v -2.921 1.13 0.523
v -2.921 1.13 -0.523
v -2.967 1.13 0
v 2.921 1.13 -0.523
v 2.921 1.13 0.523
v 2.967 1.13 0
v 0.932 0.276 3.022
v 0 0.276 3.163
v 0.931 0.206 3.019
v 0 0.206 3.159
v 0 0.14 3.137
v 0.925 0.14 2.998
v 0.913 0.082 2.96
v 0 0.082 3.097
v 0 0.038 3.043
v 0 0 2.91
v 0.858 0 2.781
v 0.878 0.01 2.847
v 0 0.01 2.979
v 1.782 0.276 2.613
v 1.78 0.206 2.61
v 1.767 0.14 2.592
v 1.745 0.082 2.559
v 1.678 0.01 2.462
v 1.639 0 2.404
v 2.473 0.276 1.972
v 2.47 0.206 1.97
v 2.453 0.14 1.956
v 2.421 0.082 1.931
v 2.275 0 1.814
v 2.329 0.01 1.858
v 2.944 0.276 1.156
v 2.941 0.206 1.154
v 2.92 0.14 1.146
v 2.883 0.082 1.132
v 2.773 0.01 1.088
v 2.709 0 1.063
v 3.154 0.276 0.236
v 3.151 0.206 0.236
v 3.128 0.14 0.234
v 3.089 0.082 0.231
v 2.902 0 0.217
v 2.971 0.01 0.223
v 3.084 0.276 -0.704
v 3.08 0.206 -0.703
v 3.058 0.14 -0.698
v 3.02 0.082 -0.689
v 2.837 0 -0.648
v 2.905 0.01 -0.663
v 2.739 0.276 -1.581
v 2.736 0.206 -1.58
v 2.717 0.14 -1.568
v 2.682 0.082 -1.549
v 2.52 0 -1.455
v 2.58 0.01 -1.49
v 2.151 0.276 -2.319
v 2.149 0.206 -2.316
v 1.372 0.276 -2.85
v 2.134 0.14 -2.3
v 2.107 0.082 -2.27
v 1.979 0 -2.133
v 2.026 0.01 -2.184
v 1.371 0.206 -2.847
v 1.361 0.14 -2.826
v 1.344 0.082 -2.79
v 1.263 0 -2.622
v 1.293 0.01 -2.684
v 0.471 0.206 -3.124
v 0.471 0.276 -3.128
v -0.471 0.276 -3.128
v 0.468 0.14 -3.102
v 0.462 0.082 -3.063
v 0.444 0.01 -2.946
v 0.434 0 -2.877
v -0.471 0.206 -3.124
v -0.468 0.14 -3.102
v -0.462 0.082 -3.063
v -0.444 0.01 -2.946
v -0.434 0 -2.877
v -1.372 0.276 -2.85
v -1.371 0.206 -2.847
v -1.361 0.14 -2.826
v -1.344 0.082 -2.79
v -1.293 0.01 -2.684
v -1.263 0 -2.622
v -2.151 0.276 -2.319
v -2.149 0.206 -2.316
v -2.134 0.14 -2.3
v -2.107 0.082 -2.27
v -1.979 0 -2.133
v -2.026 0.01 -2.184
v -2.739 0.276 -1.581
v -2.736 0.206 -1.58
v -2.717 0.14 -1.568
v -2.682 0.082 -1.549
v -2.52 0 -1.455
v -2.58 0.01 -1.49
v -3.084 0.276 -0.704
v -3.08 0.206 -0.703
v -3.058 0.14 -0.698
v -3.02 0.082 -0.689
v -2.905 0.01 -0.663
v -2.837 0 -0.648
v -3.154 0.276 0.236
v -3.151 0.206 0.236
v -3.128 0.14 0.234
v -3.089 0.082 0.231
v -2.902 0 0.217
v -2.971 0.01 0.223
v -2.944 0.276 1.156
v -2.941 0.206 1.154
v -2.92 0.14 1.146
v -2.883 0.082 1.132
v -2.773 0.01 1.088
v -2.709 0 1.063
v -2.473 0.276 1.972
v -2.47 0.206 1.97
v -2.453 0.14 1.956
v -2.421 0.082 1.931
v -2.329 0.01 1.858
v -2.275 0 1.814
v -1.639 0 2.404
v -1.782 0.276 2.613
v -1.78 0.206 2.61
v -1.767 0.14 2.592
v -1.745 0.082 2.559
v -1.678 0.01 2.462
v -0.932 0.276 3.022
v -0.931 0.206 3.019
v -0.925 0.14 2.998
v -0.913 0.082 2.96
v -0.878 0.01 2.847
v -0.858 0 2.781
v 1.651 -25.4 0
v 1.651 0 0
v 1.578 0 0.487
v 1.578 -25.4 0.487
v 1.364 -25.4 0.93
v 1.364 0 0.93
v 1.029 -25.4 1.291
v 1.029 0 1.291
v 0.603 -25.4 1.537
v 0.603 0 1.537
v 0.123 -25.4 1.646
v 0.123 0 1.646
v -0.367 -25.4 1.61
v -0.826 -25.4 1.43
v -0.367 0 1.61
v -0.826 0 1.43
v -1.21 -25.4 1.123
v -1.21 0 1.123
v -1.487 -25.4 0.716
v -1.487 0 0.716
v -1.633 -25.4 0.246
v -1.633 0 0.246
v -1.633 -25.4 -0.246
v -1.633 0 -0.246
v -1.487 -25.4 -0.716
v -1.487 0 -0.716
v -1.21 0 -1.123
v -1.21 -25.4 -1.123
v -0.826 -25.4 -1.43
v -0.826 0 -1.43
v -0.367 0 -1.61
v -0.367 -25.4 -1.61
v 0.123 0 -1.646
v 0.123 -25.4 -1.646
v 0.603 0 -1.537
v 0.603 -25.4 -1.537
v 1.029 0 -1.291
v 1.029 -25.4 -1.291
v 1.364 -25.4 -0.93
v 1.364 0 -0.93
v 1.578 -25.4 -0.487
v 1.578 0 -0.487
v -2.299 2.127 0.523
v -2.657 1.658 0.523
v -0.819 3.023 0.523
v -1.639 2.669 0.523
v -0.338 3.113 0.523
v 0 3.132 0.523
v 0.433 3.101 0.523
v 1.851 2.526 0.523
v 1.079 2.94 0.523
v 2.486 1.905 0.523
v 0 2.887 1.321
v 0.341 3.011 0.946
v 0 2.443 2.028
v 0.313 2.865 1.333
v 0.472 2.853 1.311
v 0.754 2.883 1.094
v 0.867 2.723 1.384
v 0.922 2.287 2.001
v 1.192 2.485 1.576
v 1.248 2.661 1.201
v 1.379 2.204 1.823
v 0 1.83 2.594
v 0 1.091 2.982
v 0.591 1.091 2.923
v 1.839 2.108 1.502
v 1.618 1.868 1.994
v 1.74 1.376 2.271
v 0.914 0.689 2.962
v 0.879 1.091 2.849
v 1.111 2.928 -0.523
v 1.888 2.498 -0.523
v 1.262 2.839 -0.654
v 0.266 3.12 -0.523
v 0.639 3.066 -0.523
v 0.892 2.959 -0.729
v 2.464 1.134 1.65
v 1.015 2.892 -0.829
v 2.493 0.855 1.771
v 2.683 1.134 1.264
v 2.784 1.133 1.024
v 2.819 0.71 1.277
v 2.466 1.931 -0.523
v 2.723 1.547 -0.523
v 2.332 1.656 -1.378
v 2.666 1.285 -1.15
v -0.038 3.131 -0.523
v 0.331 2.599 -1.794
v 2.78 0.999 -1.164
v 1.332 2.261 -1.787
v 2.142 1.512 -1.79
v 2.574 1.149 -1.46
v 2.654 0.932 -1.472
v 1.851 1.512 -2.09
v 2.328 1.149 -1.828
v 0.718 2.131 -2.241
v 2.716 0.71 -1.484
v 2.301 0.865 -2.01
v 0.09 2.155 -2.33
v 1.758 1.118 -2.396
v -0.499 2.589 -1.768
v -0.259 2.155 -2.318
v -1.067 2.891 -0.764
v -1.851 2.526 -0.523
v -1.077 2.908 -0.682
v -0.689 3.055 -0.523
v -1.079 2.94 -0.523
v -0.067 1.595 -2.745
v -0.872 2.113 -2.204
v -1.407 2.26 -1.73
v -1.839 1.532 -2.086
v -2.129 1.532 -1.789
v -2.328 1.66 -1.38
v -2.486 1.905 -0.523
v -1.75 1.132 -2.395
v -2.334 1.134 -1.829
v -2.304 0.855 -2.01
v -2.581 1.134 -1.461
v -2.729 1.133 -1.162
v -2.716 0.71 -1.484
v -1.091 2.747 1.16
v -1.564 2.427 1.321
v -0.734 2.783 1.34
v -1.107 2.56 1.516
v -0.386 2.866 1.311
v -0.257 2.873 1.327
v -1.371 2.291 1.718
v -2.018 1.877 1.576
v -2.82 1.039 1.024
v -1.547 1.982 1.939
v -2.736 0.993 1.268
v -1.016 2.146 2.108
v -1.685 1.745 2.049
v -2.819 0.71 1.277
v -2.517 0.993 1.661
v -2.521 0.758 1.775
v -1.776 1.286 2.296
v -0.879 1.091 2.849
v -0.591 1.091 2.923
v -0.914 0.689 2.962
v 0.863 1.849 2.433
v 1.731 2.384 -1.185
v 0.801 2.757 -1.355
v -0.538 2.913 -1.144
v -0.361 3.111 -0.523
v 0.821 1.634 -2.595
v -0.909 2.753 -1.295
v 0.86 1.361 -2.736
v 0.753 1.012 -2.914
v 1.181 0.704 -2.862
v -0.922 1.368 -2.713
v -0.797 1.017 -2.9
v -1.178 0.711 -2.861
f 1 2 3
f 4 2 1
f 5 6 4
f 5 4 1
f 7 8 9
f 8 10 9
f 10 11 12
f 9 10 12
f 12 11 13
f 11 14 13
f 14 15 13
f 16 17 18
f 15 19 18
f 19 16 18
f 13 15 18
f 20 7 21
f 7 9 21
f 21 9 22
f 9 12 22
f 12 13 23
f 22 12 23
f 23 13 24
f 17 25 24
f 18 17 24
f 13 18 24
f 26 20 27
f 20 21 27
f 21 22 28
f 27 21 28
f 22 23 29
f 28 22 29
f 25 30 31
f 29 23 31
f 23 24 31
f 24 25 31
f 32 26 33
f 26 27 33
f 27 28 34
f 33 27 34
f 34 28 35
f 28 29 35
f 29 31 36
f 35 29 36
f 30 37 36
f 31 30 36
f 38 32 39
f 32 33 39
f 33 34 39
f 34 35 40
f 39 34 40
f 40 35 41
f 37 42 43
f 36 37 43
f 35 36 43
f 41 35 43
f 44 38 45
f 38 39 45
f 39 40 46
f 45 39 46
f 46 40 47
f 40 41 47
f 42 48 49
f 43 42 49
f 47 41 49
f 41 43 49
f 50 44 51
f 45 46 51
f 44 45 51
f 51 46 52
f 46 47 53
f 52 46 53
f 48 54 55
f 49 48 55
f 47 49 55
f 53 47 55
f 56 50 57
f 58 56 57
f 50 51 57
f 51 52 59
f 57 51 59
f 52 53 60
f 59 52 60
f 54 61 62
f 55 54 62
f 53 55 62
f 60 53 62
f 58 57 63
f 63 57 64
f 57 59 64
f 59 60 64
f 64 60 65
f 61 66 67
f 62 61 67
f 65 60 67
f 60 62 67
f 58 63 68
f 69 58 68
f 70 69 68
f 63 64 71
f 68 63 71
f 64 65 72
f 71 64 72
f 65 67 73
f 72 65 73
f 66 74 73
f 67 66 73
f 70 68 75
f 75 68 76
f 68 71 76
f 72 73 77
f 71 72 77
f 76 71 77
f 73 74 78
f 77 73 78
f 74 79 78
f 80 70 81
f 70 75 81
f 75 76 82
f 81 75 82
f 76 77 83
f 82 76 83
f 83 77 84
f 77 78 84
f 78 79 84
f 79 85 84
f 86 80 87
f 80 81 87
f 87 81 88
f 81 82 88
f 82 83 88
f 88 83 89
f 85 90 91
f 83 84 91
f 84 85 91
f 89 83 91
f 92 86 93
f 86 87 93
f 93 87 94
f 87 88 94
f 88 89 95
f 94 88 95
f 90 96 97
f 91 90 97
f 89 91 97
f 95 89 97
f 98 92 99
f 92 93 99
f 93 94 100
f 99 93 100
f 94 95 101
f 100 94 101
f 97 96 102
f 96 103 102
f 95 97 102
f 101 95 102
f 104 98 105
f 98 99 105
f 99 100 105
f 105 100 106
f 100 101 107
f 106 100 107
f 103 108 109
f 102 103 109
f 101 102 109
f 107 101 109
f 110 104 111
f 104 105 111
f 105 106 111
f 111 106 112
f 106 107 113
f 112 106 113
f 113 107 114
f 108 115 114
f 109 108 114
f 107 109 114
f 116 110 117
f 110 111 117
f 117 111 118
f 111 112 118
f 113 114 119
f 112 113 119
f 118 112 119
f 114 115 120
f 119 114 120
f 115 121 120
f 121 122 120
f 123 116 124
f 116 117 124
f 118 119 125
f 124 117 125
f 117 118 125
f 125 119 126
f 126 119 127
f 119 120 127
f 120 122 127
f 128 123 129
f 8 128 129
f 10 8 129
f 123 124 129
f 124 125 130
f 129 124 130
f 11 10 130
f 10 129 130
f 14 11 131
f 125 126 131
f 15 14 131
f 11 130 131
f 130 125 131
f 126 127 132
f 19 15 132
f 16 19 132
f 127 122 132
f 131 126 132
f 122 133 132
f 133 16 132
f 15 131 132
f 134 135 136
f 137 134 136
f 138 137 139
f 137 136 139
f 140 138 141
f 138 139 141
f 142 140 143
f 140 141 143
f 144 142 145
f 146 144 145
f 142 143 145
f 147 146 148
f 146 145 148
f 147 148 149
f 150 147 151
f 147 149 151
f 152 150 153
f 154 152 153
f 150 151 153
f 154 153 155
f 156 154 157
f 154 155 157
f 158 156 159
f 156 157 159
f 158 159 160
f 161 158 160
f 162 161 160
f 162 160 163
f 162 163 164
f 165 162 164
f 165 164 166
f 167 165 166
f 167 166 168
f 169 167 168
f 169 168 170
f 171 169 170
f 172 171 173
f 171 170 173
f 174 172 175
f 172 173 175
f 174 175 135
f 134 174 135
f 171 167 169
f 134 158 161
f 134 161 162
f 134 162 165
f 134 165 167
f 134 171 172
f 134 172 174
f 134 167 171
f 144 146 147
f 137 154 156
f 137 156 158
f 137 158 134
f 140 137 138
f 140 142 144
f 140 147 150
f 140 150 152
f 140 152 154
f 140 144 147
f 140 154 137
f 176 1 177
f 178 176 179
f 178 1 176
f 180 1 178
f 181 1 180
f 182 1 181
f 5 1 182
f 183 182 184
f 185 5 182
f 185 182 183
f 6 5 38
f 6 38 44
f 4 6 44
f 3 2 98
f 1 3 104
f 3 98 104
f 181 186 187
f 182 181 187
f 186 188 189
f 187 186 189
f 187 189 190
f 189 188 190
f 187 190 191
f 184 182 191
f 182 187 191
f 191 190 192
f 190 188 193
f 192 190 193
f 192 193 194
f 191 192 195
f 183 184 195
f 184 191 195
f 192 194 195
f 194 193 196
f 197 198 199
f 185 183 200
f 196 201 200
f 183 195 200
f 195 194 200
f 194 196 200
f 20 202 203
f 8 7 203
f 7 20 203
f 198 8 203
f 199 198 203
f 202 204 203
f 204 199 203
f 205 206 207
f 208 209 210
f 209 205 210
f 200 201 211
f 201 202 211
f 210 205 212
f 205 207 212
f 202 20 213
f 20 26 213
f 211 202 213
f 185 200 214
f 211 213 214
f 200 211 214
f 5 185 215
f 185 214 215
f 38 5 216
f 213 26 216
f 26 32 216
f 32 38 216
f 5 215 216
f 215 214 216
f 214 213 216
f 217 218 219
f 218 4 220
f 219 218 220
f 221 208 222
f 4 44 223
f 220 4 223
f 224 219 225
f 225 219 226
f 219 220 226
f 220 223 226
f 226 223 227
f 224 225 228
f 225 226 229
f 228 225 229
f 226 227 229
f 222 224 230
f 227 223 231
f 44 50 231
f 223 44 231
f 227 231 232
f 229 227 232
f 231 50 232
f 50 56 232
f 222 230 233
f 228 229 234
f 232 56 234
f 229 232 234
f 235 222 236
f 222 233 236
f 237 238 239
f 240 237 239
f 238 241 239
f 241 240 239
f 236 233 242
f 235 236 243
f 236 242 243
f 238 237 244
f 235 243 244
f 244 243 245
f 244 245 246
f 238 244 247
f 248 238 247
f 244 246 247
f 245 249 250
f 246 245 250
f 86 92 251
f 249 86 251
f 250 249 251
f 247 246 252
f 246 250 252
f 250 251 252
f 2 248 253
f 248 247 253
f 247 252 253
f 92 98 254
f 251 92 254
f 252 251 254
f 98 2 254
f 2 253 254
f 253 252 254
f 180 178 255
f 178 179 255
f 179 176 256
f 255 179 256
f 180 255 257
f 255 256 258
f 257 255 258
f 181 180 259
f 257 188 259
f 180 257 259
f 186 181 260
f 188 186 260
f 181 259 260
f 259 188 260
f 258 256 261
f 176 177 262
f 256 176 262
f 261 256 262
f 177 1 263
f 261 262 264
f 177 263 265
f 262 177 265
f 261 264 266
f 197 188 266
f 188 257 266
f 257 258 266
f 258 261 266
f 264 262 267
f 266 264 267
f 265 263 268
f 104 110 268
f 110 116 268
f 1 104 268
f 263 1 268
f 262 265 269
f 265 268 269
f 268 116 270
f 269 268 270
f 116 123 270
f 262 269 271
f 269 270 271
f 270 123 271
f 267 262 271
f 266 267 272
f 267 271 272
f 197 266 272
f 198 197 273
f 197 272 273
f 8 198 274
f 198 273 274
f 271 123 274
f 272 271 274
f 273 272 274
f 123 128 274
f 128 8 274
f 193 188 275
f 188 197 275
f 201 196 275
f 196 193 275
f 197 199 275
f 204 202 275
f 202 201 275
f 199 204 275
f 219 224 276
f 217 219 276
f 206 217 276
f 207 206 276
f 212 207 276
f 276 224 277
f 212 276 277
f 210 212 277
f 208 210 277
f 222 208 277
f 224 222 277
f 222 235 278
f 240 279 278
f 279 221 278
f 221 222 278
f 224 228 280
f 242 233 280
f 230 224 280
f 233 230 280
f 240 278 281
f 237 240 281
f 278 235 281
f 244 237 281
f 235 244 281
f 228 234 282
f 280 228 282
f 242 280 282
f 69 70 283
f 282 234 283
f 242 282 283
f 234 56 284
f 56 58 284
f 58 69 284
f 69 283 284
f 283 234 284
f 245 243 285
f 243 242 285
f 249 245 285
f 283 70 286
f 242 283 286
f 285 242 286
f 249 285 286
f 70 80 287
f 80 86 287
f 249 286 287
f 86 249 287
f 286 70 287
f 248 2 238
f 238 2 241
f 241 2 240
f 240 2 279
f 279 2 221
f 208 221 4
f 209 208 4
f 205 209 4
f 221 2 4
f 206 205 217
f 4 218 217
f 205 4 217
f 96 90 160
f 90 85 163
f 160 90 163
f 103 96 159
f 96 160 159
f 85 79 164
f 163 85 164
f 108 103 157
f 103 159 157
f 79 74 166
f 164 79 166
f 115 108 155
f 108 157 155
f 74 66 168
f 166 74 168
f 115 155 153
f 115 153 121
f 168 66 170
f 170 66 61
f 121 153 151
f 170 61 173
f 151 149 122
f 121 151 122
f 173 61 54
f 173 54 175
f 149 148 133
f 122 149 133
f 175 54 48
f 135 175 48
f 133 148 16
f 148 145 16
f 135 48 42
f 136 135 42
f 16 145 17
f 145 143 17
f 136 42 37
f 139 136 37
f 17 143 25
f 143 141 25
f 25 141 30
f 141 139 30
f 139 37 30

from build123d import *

# Parameters (mm, degrees)
F0_R     = 1.651
F1_DEPTH = 25.4
F4_W     = 3.124762
F4_H     = 1.046538
F5_DEPTH = 12.7


with BuildPart() as f1:
    # F0 (on Front) → F1 (new body)
    with BuildSketch(Plane.XZ):
        Circle(F0_R)
    extrude(amount=F1_DEPTH)

    # F2 (on Right) → F3 (revolve)
    with BuildSketch(Plane.YZ):
        with BuildLine():
            Line((0, 2.909936), (0, 0))
            Line((0, 0), (3.175, 0))
            ThreePointArc((3.175, 0), (2.340641, 2.145233), (0.276087, 3.162973))
            ThreePointArc((0.276087, 3.162973), (0.082381, 3.097187), (0, 2.909936))
        make_face()
    revolve(axis=Axis((0, 1.5875, 0), (0, 1, 0)))

    # F4 (on Right) → F5 (cut, symmetric)
    with BuildSketch(Plane.YZ):
        with Locations((2.691957, 0)):
            Rectangle(F4_W, F4_H)
    extrude(amount=F5_DEPTH, both=True, mode=Mode.SUBTRACT)


solid = f1.part
